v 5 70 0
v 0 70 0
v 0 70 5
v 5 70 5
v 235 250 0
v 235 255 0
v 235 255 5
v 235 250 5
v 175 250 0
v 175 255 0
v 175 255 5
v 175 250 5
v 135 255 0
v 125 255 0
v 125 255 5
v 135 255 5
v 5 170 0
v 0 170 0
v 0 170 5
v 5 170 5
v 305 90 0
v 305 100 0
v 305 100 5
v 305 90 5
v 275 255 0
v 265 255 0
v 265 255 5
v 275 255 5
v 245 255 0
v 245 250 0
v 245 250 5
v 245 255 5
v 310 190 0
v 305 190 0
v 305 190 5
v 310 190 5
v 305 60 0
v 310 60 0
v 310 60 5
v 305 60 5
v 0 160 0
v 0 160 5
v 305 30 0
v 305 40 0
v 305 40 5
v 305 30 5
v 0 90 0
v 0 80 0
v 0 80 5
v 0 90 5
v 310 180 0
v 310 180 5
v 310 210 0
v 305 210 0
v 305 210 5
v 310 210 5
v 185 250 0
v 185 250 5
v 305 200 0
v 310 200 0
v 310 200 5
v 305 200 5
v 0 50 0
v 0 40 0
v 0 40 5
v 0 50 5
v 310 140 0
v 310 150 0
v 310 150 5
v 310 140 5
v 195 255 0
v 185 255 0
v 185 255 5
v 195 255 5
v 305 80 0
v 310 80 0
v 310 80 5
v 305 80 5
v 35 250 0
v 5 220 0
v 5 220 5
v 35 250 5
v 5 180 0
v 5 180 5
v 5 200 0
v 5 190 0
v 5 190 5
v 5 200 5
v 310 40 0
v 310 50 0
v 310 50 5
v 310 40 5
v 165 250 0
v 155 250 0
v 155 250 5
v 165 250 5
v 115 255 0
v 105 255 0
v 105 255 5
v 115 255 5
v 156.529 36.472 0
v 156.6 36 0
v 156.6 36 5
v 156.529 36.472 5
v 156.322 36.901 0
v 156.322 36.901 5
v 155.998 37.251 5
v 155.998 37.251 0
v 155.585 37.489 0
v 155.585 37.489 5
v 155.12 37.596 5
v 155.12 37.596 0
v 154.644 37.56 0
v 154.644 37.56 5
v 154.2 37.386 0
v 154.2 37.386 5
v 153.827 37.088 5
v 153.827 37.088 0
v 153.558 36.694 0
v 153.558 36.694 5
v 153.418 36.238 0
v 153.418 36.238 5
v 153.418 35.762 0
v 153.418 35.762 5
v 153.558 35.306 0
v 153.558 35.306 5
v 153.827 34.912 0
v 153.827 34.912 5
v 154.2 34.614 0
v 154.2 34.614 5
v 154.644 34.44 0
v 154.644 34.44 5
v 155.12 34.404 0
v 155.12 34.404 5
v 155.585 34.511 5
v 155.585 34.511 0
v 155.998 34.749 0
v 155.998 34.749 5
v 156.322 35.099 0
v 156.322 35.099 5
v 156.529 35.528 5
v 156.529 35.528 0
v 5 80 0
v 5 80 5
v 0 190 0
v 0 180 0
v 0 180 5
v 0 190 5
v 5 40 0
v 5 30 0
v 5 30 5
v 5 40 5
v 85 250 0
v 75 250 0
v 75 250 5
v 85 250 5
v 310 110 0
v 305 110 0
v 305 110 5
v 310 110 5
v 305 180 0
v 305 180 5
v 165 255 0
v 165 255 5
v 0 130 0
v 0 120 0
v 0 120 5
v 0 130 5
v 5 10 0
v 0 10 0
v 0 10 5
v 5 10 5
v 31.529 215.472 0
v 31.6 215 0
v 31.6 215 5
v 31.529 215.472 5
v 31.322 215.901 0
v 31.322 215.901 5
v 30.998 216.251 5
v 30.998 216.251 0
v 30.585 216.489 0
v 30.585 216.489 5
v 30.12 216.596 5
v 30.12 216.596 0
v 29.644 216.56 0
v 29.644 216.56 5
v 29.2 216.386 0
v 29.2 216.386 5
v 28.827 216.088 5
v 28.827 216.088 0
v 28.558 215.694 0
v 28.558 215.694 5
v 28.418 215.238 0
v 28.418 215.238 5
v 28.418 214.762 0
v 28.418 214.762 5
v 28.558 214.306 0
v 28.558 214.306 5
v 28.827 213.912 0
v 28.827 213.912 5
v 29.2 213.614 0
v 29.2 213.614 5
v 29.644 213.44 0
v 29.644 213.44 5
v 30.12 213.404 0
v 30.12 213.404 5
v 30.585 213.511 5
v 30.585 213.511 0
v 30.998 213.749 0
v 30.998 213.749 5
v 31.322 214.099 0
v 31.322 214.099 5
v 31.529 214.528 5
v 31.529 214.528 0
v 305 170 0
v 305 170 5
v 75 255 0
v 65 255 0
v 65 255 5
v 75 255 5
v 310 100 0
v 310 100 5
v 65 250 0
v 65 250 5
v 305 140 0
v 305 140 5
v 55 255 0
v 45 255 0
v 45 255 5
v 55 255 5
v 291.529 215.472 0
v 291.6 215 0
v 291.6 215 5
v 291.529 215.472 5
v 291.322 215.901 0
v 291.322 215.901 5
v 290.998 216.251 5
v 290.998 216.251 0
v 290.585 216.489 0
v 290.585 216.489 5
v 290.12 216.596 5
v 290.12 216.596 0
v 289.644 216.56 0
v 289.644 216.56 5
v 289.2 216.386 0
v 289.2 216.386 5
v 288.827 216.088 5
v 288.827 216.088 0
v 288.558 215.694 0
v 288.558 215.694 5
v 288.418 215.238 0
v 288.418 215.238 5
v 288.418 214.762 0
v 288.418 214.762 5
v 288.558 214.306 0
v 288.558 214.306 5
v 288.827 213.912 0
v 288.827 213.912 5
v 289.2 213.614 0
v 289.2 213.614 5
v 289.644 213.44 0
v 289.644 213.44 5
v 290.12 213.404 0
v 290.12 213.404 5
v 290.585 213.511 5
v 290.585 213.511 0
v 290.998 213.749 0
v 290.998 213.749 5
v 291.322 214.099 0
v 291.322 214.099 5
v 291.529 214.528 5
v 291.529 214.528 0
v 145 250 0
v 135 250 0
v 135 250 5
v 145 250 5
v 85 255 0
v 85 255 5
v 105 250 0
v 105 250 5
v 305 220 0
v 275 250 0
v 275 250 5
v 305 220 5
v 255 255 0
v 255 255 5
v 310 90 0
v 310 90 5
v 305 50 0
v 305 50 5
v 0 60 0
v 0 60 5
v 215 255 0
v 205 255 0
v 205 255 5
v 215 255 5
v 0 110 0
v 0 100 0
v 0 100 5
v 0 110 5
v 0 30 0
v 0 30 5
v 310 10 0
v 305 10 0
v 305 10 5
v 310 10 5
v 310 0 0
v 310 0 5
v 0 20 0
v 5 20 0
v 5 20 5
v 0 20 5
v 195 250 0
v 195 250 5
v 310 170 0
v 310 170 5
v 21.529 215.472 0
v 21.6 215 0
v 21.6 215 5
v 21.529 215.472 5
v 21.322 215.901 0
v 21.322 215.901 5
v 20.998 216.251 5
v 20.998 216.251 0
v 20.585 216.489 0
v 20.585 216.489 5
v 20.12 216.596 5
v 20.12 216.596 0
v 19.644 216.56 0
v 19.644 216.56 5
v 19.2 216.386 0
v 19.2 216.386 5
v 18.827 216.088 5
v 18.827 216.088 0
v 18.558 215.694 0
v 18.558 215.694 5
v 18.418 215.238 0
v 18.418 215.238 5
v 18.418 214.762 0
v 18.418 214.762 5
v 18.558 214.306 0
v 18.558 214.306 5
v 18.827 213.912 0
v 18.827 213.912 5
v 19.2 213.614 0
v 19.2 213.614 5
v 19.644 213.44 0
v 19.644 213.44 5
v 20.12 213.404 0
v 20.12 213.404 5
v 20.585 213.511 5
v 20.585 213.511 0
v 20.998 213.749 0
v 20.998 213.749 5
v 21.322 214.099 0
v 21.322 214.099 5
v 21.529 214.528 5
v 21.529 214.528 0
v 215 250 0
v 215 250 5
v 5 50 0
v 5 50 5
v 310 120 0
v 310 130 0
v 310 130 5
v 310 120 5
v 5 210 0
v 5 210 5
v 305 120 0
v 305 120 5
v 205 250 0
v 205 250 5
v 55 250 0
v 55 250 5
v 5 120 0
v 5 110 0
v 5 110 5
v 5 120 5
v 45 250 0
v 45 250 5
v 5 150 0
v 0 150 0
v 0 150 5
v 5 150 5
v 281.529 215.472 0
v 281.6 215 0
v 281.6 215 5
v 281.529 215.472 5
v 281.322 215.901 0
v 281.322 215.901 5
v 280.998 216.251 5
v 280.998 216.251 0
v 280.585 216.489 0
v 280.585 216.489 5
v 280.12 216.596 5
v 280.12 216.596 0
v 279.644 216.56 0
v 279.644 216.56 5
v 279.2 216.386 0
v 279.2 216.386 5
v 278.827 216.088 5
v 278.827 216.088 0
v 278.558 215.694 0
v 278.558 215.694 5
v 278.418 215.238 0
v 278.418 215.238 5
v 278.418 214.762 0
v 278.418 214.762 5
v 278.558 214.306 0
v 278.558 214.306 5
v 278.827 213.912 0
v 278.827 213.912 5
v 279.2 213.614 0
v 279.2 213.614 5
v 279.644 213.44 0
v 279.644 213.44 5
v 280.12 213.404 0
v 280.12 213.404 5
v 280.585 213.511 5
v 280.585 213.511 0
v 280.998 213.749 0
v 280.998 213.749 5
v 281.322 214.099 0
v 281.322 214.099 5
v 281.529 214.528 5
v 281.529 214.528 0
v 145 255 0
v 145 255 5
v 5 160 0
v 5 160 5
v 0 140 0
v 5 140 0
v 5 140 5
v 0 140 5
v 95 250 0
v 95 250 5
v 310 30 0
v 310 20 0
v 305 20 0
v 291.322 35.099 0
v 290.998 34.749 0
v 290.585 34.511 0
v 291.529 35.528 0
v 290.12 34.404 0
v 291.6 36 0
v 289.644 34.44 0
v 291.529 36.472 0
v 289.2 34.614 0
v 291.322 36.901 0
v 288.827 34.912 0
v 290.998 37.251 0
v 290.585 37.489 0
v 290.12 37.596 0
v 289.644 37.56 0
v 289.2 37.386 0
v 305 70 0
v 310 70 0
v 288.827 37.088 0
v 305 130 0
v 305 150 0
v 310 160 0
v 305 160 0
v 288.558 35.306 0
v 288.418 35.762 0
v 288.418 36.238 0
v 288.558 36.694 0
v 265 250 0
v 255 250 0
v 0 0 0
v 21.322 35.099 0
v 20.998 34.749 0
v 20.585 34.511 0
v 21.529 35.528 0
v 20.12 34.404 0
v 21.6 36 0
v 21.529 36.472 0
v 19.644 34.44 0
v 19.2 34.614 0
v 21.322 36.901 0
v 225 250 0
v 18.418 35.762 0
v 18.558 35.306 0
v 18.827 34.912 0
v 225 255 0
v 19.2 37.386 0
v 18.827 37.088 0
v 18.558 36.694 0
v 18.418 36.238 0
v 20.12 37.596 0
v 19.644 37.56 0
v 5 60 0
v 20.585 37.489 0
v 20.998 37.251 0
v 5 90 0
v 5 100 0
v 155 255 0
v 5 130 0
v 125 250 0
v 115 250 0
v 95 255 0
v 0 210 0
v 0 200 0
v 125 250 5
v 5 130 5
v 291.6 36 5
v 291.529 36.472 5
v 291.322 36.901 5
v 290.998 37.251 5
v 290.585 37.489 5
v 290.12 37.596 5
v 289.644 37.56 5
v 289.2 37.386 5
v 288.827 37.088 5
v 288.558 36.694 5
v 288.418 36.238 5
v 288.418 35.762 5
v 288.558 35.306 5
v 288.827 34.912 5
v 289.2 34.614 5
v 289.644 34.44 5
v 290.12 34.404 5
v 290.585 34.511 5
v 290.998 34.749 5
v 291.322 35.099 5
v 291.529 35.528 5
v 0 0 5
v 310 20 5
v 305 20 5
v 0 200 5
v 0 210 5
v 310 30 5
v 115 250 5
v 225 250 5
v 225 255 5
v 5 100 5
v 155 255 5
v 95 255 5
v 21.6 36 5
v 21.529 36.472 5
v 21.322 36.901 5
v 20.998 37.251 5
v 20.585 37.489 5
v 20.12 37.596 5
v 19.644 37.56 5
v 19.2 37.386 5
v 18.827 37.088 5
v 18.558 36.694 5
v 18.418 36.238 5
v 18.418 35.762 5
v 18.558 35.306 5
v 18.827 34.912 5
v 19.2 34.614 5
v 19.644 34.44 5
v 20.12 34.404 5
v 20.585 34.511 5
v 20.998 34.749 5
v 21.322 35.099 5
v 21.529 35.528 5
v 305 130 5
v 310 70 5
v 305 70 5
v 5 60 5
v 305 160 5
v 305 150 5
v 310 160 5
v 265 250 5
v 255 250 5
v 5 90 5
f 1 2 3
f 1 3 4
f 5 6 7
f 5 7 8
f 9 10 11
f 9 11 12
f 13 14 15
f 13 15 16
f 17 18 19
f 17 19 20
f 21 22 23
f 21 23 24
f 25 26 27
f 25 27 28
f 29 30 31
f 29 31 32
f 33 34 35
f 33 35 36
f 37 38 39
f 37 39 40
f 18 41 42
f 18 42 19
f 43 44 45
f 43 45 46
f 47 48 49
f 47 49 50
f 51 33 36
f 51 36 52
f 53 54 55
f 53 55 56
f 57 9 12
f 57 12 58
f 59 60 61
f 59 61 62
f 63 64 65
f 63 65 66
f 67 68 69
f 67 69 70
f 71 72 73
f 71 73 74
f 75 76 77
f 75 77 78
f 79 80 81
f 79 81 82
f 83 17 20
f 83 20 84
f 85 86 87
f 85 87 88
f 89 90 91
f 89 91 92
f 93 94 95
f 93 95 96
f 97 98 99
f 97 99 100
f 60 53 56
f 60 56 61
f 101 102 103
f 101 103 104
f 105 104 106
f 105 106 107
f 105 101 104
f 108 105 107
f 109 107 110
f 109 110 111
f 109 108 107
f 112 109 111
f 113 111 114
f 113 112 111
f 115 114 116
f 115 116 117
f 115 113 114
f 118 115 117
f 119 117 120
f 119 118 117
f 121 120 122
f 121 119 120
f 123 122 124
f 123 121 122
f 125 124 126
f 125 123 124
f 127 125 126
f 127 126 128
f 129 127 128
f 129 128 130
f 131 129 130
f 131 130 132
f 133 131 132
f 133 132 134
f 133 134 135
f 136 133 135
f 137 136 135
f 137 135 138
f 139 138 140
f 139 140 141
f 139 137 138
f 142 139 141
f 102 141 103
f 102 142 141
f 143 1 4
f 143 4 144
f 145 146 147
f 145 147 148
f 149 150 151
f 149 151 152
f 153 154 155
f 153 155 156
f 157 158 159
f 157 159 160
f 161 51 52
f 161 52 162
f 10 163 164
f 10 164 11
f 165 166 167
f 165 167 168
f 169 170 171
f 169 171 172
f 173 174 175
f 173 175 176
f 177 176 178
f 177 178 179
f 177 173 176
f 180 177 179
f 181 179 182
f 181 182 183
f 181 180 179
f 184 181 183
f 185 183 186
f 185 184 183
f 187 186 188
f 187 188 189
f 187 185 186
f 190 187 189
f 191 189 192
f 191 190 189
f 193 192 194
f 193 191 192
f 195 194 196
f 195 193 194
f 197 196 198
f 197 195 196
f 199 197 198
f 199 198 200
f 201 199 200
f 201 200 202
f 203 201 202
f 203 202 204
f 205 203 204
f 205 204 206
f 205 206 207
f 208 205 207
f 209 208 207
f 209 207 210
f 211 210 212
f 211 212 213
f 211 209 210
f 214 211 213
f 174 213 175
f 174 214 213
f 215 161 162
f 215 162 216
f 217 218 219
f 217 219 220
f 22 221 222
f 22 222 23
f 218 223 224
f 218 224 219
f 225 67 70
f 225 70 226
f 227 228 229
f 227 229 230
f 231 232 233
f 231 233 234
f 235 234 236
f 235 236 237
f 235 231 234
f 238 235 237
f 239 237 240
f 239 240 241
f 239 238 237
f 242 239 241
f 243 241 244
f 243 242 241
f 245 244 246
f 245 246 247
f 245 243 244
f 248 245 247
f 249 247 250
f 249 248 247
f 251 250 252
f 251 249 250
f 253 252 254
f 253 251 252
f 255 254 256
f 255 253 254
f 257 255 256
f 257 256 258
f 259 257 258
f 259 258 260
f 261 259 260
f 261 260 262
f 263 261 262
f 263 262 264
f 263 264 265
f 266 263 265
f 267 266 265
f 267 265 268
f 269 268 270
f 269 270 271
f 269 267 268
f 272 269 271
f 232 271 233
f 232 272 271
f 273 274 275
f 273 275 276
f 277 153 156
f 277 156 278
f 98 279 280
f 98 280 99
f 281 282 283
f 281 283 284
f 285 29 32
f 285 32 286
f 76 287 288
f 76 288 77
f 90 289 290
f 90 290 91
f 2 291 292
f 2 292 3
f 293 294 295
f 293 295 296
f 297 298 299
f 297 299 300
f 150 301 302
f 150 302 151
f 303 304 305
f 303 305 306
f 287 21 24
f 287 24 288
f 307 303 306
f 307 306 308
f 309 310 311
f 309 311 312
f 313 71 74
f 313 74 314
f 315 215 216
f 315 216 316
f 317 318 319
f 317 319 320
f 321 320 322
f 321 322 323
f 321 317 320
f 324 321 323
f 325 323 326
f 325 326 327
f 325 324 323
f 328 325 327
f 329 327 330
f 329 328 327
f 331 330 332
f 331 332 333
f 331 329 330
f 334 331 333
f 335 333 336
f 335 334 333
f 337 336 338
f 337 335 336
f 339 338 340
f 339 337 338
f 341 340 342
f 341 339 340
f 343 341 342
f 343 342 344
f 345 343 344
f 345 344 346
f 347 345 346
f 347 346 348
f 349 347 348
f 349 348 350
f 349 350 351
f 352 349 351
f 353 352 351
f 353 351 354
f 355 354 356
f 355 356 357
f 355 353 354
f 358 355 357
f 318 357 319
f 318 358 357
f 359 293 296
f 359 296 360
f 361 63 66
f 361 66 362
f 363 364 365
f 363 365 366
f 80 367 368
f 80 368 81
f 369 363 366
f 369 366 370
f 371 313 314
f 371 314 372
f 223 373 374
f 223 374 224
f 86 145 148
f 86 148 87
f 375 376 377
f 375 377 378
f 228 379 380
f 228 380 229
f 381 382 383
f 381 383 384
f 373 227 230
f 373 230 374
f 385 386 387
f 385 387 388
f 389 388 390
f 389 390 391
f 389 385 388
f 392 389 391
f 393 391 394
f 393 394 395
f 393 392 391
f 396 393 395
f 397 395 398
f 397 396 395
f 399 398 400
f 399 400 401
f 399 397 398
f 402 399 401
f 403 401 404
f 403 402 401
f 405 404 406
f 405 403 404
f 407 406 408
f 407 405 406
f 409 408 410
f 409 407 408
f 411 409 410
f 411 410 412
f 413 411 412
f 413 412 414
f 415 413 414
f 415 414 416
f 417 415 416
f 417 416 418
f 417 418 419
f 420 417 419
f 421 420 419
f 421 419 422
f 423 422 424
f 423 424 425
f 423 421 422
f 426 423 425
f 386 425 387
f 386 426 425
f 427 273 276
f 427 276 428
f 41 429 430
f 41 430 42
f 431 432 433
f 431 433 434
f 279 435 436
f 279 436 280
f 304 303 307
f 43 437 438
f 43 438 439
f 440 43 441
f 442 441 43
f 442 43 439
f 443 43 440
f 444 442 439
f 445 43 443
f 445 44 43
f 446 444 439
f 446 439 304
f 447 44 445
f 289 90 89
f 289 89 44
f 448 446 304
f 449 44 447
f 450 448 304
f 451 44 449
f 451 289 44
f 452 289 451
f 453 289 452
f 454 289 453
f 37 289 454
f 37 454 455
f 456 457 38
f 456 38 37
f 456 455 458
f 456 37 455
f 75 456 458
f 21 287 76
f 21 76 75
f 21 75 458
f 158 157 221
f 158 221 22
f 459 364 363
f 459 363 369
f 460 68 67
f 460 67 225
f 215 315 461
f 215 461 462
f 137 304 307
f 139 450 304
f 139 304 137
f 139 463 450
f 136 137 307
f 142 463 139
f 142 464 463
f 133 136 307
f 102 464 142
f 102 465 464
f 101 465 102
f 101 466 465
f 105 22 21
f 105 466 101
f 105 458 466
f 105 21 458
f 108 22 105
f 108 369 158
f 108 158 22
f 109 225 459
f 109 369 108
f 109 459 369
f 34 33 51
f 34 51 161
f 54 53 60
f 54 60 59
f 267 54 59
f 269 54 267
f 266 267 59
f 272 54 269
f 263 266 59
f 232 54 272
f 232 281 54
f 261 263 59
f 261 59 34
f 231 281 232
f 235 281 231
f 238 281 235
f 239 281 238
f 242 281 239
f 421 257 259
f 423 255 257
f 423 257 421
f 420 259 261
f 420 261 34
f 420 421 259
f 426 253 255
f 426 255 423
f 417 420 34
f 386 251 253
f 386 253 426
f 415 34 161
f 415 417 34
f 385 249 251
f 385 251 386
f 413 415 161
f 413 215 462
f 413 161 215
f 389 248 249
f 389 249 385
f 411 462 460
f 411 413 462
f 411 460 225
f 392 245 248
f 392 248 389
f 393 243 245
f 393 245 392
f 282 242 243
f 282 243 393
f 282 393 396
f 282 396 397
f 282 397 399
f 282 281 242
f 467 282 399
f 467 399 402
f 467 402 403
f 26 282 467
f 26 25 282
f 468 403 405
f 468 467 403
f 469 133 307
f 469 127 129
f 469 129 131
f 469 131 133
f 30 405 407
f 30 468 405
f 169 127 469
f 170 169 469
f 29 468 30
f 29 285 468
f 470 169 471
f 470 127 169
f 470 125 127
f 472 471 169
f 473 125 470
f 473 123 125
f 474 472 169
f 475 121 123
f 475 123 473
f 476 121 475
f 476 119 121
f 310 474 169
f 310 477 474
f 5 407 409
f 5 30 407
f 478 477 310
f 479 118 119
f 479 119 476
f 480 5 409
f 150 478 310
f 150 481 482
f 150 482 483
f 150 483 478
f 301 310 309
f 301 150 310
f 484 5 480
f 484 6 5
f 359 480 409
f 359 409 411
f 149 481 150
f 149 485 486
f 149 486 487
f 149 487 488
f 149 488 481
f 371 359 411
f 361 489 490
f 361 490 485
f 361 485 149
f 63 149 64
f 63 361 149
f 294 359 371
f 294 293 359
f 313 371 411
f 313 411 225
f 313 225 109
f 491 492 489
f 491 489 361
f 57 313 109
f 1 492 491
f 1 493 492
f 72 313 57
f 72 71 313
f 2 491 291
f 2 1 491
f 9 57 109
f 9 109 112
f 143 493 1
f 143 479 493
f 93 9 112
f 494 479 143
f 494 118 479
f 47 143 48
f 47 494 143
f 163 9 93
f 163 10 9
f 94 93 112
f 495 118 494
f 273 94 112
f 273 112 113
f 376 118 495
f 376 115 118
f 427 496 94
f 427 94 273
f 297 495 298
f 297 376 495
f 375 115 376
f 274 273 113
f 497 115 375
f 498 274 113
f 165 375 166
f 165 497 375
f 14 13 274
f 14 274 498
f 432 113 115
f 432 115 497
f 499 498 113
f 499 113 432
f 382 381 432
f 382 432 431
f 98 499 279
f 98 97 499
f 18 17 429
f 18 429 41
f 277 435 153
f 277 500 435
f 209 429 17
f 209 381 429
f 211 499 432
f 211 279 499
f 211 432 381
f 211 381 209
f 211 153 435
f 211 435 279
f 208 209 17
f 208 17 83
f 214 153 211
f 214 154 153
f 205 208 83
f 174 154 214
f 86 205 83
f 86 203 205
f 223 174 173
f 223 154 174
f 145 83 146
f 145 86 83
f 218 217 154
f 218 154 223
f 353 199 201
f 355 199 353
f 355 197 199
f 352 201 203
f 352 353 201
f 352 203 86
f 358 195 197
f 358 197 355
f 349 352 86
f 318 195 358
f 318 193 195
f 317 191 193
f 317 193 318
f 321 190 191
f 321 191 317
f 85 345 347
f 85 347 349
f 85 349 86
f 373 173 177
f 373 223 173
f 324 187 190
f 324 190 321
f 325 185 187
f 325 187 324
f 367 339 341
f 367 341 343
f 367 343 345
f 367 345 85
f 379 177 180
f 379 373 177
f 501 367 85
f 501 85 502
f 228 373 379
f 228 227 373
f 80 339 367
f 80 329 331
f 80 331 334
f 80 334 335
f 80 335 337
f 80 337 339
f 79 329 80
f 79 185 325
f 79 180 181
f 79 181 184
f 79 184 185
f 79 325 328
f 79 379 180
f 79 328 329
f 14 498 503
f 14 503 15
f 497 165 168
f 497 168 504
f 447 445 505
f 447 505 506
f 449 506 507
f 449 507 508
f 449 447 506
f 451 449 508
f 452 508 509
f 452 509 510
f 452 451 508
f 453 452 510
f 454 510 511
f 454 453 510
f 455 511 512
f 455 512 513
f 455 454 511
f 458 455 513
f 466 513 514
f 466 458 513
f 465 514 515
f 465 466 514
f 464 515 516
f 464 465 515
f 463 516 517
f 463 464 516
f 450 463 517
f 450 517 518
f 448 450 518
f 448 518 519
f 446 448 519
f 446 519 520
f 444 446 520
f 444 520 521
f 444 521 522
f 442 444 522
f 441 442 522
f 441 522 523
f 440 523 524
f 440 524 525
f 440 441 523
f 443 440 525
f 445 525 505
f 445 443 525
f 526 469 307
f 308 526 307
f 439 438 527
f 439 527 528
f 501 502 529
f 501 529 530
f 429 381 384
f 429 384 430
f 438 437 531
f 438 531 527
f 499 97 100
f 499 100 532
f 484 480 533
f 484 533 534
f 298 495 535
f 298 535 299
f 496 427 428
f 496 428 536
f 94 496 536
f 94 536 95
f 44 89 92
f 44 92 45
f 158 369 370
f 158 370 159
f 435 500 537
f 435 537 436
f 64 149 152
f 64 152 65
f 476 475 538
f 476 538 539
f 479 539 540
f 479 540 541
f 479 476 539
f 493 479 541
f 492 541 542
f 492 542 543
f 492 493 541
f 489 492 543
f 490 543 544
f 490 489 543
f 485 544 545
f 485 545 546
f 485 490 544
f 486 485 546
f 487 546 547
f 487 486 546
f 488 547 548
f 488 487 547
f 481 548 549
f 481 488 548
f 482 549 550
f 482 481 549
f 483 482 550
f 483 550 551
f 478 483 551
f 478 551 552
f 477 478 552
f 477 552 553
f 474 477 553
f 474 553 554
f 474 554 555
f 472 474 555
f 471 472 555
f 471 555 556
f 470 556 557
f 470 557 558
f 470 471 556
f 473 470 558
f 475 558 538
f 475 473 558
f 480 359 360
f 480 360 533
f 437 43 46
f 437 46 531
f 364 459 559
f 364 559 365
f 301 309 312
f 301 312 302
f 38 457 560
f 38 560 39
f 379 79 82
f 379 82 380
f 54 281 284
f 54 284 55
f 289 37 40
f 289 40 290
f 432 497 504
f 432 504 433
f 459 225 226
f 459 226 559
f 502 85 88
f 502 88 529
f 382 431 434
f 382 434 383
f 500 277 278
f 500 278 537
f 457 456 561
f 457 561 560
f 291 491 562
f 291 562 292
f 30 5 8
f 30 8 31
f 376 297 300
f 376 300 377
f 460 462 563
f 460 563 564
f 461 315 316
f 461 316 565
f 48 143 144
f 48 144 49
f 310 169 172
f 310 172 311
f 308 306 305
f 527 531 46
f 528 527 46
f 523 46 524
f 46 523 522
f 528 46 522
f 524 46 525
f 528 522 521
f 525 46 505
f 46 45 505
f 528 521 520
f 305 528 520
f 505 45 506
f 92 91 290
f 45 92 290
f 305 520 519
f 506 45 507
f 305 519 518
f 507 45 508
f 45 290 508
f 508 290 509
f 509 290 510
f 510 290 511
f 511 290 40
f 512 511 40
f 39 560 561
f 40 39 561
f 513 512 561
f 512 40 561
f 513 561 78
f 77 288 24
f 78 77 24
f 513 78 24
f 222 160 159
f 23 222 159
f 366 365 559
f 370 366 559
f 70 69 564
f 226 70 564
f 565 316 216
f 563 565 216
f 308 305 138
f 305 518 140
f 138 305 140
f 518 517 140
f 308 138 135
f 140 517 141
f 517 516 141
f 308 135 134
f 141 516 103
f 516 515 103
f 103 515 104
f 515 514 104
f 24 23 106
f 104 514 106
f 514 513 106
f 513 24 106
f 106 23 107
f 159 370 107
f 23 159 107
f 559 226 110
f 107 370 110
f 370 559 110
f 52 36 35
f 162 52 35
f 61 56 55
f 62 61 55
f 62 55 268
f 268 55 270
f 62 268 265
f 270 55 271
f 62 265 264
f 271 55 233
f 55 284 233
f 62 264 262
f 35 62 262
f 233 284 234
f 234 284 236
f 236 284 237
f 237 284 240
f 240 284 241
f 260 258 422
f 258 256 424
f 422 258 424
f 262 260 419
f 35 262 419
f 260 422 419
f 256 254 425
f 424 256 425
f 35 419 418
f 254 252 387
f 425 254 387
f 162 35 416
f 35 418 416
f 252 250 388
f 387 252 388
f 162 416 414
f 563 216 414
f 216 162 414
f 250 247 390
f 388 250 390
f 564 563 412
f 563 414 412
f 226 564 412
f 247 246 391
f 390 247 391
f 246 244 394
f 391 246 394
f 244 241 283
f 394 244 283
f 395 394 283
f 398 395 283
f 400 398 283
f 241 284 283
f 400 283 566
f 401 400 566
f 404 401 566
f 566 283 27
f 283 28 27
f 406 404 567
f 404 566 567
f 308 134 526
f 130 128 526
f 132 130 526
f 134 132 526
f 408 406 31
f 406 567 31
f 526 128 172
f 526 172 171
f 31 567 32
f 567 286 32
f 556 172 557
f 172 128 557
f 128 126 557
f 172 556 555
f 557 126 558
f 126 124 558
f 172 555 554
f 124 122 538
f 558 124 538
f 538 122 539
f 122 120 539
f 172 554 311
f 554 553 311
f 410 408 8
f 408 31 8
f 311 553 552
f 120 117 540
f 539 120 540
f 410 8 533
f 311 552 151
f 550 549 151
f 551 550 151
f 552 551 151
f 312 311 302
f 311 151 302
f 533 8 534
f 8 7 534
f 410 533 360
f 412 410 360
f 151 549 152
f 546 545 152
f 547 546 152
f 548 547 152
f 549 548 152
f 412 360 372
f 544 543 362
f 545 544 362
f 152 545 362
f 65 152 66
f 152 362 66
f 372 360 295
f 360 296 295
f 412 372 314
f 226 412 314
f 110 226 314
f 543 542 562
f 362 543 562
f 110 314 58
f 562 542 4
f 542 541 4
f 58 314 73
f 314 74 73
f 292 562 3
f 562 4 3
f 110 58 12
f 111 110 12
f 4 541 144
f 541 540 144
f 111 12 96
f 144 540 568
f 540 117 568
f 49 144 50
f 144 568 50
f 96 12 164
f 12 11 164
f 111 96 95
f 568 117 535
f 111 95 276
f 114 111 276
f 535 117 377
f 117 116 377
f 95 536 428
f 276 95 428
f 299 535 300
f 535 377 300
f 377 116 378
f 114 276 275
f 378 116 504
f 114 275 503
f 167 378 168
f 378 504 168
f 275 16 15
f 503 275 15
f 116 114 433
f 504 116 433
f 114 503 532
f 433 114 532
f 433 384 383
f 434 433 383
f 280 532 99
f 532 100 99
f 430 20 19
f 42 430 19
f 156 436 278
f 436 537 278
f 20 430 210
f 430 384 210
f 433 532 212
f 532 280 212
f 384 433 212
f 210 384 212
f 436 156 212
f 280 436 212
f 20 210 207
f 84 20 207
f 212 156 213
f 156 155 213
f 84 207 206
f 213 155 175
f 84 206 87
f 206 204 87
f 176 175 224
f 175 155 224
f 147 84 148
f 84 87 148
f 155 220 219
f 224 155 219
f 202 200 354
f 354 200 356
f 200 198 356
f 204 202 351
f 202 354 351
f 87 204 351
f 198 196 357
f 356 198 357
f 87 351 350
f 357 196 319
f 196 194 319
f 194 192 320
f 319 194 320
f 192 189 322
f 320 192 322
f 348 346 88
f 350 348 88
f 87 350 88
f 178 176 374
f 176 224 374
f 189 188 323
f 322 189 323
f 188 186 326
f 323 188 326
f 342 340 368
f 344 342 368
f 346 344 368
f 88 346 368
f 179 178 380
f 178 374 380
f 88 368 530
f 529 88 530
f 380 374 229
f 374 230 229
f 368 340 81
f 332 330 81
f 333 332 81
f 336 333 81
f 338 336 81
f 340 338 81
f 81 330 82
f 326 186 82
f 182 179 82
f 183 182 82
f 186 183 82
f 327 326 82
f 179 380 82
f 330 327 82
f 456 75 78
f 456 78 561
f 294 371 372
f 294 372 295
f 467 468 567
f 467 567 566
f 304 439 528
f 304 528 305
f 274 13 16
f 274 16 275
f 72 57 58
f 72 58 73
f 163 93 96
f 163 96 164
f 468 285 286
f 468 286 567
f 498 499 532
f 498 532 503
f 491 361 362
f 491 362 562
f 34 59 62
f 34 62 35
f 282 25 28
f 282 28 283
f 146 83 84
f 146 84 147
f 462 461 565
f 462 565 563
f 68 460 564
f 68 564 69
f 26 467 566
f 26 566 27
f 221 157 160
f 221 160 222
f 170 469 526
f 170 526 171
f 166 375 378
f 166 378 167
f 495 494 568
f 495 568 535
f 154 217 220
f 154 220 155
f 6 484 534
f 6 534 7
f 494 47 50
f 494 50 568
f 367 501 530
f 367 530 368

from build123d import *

# Parameters (mm, degrees)
SKIZZE1_R                       = 1.6
AUFSATZ_LINEAR_AUSTRAGEN1_DEPTH = 5


with BuildPart() as part:
    # Skizze1 → Aufsatz-Linear austragen1 (new body)
    with BuildSketch(Plane.XY):
        Polygon((5, 10), (5, 20), (0, 20), (0, 30), (5, 30), (5, 40), (0, 40), (0, 50), (5, 50), (5, 60), (0, 60), (0, 70), (5, 70), (5, 80), (0, 80), (0, 90), (5, 90), (5, 100), (0, 100), (0, 110), (5, 110), (5, 120), (0, 120), (0, 130), (5, 130), (5, 140), (0, 140), (0, 150), (5, 150), (5, 160), (0, 160), (0, 170), (5, 170), (5, 180), (0, 180), (0, 190), (5, 190), (5, 200), (0, 200), (0, 210), (5, 210), (5, 220), (35, 250), (45, 250), (45, 255), (55, 255), (55, 250), (65, 250), (65, 255), (75, 255), (75, 250), (85, 250), (85, 255), (95, 255), (95, 250), (105, 250), (105, 255), (115, 255), (115, 250), (125, 250), (125, 255), (135, 255), (135, 250), (145, 250), (145, 255), (155, 255), (155, 250), (165, 250), (165, 255), (175, 255), (175, 250), (185, 250), (185, 255), (195, 255), (195, 250), (205, 250), (205, 255), (215, 255), (215, 250), (225, 250), (225, 255), (235, 255), (235, 250), (245, 250), (245, 255), (255, 255), (255, 250), (265, 250), (265, 255), (275, 255), (275, 250), (305, 220), (305, 210), (310, 210), (310, 200), (305, 200), (305, 190), (310, 190), (310, 180), (305, 180), (305, 170), (310, 170), (310, 160), (305, 160), (305, 150), (310, 150), (310, 140), (305, 140), (305, 130), (310, 130), (310, 120), (305, 120), (305, 110), (310, 110), (310, 100), (305, 100), (305, 90), (310, 90), (310, 80), (305, 80), (305, 70), (310, 70), (310, 60), (305, 60), (305, 50), (310, 50), (310, 40), (305, 40), (305, 30), (310, 30), (310, 20), (305, 20), (305, 10), (310, 10), (310, 0), (305, 0), (5, 0), (0, 0), (0, 10), align=None)
        with Locations((20, 215)):
            Circle(SKIZZE1_R, mode=Mode.SUBTRACT)
        with Locations((30, 215)):
            Circle(SKIZZE1_R, mode=Mode.SUBTRACT)
        with Locations((290, 215)):
            Circle(SKIZZE1_R, mode=Mode.SUBTRACT)
        with Locations((280, 215)):
            Circle(SKIZZE1_R, mode=Mode.SUBTRACT)
        with Locations((20, 36)):
            Circle(SKIZZE1_R, mode=Mode.SUBTRACT)
        with Locations((155, 36)):
            Circle(SKIZZE1_R, mode=Mode.SUBTRACT)
        with Locations((290, 36)):
            Circle(SKIZZE1_R, mode=Mode.SUBTRACT)
    extrude(amount=AUFSATZ_LINEAR_AUSTRAGEN1_DEPTH)


solid = part.part
